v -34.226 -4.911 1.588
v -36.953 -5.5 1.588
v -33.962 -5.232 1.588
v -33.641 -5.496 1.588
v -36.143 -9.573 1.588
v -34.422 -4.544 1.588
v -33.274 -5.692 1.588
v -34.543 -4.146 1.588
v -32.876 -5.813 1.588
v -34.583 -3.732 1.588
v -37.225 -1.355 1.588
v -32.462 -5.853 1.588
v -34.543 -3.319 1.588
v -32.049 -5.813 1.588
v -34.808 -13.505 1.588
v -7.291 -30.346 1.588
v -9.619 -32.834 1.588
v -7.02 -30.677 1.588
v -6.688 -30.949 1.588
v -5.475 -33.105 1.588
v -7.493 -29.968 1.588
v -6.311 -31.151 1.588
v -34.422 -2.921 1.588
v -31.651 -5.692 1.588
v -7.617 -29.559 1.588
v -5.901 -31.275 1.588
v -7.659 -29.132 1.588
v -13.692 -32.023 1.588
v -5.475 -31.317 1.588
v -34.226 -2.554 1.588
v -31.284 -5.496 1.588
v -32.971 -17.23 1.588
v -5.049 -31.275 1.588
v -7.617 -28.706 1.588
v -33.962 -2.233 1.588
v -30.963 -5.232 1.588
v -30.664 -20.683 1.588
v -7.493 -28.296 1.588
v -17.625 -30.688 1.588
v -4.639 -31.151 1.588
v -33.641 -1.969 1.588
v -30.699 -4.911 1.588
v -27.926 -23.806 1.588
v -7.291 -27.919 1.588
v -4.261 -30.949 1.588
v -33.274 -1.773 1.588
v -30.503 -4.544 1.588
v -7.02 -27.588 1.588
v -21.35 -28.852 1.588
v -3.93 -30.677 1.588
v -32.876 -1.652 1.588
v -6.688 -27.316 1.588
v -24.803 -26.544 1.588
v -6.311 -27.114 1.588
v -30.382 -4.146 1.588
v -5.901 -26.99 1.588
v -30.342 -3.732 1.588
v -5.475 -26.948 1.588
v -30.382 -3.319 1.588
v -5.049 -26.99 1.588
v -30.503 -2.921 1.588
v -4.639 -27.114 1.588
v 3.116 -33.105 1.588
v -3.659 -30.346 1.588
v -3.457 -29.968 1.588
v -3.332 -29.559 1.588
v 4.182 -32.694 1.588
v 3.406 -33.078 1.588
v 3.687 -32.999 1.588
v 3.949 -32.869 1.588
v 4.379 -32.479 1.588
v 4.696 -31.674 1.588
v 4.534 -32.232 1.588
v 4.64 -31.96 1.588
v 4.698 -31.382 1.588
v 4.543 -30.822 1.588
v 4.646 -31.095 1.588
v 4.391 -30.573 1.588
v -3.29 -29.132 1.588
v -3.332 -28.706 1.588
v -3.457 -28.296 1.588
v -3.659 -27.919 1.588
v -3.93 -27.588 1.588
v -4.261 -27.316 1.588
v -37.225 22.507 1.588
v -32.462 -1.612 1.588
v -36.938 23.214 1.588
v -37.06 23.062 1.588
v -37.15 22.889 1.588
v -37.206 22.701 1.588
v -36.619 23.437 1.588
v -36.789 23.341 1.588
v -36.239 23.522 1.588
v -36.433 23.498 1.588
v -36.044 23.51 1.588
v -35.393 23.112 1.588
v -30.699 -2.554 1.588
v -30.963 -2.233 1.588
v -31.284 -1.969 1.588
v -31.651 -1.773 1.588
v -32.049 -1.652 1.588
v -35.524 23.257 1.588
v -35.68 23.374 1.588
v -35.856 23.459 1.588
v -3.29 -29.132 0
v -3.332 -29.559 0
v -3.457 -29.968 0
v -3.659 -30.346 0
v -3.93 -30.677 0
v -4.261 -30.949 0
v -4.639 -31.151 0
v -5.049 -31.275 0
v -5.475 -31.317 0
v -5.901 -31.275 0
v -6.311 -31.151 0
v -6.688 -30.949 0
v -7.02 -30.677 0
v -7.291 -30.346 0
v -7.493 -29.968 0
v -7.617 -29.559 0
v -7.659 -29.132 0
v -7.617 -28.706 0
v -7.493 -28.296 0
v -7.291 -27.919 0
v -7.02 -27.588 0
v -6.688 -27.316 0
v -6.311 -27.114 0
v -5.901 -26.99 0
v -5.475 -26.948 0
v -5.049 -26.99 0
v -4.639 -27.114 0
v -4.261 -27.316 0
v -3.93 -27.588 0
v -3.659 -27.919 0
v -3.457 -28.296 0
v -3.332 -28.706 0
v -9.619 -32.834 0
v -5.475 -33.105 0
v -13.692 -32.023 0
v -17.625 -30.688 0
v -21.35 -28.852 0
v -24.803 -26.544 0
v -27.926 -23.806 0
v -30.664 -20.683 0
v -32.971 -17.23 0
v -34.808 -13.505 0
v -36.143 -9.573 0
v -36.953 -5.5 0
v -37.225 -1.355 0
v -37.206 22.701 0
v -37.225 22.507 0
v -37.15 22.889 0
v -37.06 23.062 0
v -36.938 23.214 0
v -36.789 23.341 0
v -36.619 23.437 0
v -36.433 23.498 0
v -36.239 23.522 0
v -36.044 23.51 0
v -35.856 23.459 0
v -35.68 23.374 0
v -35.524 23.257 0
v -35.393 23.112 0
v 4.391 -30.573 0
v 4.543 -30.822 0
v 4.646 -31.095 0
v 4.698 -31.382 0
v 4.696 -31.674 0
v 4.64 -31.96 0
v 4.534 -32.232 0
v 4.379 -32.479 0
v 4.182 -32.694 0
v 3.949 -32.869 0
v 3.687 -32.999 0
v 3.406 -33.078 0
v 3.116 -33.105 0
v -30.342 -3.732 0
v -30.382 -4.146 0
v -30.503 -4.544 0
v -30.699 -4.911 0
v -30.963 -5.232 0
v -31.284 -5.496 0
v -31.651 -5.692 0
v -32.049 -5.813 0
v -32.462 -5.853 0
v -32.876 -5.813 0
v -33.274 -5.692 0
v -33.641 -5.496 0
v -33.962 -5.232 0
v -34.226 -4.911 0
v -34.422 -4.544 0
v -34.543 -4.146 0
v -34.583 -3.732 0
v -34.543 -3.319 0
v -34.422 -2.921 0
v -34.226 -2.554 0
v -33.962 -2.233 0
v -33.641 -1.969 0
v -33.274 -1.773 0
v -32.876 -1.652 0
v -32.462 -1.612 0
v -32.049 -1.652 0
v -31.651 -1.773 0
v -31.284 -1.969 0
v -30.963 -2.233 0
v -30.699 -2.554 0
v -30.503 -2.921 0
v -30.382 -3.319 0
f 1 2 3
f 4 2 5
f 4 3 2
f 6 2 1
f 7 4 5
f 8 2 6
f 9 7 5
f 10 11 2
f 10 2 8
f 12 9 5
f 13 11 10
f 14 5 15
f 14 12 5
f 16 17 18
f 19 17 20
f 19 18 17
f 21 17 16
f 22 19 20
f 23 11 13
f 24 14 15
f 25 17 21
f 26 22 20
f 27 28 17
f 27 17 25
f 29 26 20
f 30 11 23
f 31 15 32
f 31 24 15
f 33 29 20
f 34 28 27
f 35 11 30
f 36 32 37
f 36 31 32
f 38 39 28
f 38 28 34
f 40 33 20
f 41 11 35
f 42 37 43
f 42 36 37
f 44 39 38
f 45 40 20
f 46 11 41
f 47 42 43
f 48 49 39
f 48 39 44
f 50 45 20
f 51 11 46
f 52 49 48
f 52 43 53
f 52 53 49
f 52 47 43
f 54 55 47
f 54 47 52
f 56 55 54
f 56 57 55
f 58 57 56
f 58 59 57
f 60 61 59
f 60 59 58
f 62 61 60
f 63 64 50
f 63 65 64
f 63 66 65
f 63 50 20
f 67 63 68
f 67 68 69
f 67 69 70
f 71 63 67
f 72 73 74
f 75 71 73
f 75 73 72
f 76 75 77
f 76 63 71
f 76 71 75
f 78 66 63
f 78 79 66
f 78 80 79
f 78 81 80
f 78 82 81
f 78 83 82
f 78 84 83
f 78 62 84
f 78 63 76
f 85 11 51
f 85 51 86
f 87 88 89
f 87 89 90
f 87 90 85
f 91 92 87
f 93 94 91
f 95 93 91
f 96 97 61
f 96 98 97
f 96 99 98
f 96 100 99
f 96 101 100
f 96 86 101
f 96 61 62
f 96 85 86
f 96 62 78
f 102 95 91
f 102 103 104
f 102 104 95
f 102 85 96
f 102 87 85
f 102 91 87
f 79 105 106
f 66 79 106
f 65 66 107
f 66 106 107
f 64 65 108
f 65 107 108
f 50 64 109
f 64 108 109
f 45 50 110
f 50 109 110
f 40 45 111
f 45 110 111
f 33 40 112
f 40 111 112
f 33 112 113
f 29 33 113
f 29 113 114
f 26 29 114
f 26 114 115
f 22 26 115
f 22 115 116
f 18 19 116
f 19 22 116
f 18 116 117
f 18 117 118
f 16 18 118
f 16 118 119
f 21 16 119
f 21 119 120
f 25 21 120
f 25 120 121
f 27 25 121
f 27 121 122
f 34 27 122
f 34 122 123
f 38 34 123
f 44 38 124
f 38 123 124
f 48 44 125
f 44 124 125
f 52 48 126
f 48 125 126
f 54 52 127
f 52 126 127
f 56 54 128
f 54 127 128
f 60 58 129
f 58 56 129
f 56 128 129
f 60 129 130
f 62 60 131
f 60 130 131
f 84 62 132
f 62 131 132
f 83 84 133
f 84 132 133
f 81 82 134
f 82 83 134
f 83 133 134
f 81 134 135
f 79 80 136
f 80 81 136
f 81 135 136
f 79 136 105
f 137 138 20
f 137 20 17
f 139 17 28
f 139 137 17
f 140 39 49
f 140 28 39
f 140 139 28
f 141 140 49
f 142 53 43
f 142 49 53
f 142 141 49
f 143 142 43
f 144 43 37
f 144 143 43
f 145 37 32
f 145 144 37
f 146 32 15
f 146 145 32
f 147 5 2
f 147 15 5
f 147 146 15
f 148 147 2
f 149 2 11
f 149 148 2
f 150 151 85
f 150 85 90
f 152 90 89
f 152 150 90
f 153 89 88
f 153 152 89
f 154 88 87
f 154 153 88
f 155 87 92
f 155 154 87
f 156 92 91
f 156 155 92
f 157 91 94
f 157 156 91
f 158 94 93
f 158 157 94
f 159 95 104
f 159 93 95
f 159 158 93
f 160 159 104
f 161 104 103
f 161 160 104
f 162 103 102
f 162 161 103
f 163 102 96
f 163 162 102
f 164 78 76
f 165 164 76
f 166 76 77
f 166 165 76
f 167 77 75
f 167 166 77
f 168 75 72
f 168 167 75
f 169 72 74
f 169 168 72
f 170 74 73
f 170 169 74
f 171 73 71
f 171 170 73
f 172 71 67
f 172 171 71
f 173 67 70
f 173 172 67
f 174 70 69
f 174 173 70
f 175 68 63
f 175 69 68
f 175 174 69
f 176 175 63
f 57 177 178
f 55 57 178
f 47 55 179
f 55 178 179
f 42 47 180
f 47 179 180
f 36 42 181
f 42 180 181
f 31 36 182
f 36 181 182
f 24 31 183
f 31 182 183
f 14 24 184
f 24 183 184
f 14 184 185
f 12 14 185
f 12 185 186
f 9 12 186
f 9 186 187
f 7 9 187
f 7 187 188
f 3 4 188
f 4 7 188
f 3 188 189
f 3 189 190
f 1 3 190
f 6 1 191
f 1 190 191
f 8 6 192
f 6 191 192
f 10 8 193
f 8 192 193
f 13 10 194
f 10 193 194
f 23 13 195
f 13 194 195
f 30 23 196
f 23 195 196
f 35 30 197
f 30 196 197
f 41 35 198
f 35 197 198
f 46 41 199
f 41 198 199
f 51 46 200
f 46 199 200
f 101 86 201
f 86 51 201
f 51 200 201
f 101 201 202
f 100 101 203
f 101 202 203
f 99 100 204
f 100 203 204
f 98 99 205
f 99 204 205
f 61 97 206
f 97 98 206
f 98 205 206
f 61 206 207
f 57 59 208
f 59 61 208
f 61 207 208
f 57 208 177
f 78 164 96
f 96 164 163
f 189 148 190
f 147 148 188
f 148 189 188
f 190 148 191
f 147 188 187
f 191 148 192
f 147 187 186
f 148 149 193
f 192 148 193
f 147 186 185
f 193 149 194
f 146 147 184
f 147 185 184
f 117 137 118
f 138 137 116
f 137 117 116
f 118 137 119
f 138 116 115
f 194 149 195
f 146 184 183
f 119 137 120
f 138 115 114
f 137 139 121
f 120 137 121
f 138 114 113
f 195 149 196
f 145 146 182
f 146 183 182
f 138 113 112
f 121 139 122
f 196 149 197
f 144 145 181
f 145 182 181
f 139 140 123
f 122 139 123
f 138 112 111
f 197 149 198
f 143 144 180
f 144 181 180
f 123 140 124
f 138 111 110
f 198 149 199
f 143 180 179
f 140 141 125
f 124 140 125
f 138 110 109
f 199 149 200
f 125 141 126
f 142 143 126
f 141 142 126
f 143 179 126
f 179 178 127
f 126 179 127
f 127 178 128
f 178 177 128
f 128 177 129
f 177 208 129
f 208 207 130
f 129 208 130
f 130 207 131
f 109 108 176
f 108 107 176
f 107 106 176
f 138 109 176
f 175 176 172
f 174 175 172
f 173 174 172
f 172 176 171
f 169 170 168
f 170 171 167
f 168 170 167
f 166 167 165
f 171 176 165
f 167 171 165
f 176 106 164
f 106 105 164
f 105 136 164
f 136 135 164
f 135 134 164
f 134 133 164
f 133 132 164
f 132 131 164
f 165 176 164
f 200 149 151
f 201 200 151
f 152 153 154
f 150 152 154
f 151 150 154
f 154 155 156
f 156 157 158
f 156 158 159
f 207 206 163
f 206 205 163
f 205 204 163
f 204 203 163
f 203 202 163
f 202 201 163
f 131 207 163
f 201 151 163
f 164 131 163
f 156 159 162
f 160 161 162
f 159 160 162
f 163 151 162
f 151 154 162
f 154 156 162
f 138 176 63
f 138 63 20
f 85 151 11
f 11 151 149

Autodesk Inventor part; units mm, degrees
ref_plane "YZ Plane" through (0, 0, 0) normal (1, 0, 0) x (0, 1, 0)
ref_plane "XZ Plane" through (0, 0, 0) normal (0, 1, 0) x (-1, 0, 0)
ref_plane "XY Plane" through (0, 0, 0) normal (0, 0, 1) x (1, 0, 0)
sketch "Sketch1" plane through (0, 0, 0) normal (0, 0, 1) x (1, 0, 0)
  circle A0 centre (-5.4749, -29.1324) radius 2.1844
  line L0 (-37.2249, 22.5069) -> (-37.2249, -1.3553)
  arc A1 (-35.2179, 22.7309) -> (-37.2249, 22.5069) centre (-36.2089, 22.5069) ccw
  line L1 (3.1159, -33.1053) -> (-5.4749, -33.1053)
  arc A2 (3.1159, -33.1053) -> (4.3913, -30.5726) centre (3.1159, -31.5178) ccw
  arc A3 (-37.2249, -1.3553) -> (-5.4749, -33.1053) centre (-5.4749, -1.3553) ccw
  circle A4 centre (-32.4624, -3.7324) radius 2.1209
  line L2 (4.3913, -30.5726) -> (-35.3926, 23.1119)
  point P0 (0, 0)
  point P1 (-37.2249, 40.7176)
  point P2 (9.6063, -33.1053)
  dimension "d0" = 1.016
  dimension "d1" = 1.5875
  dimension "d2" = 31.75
extrude "Extrusion1" add sketch "Sketch1" along normal blind 1.5875
properties part number "ramp_v2"
